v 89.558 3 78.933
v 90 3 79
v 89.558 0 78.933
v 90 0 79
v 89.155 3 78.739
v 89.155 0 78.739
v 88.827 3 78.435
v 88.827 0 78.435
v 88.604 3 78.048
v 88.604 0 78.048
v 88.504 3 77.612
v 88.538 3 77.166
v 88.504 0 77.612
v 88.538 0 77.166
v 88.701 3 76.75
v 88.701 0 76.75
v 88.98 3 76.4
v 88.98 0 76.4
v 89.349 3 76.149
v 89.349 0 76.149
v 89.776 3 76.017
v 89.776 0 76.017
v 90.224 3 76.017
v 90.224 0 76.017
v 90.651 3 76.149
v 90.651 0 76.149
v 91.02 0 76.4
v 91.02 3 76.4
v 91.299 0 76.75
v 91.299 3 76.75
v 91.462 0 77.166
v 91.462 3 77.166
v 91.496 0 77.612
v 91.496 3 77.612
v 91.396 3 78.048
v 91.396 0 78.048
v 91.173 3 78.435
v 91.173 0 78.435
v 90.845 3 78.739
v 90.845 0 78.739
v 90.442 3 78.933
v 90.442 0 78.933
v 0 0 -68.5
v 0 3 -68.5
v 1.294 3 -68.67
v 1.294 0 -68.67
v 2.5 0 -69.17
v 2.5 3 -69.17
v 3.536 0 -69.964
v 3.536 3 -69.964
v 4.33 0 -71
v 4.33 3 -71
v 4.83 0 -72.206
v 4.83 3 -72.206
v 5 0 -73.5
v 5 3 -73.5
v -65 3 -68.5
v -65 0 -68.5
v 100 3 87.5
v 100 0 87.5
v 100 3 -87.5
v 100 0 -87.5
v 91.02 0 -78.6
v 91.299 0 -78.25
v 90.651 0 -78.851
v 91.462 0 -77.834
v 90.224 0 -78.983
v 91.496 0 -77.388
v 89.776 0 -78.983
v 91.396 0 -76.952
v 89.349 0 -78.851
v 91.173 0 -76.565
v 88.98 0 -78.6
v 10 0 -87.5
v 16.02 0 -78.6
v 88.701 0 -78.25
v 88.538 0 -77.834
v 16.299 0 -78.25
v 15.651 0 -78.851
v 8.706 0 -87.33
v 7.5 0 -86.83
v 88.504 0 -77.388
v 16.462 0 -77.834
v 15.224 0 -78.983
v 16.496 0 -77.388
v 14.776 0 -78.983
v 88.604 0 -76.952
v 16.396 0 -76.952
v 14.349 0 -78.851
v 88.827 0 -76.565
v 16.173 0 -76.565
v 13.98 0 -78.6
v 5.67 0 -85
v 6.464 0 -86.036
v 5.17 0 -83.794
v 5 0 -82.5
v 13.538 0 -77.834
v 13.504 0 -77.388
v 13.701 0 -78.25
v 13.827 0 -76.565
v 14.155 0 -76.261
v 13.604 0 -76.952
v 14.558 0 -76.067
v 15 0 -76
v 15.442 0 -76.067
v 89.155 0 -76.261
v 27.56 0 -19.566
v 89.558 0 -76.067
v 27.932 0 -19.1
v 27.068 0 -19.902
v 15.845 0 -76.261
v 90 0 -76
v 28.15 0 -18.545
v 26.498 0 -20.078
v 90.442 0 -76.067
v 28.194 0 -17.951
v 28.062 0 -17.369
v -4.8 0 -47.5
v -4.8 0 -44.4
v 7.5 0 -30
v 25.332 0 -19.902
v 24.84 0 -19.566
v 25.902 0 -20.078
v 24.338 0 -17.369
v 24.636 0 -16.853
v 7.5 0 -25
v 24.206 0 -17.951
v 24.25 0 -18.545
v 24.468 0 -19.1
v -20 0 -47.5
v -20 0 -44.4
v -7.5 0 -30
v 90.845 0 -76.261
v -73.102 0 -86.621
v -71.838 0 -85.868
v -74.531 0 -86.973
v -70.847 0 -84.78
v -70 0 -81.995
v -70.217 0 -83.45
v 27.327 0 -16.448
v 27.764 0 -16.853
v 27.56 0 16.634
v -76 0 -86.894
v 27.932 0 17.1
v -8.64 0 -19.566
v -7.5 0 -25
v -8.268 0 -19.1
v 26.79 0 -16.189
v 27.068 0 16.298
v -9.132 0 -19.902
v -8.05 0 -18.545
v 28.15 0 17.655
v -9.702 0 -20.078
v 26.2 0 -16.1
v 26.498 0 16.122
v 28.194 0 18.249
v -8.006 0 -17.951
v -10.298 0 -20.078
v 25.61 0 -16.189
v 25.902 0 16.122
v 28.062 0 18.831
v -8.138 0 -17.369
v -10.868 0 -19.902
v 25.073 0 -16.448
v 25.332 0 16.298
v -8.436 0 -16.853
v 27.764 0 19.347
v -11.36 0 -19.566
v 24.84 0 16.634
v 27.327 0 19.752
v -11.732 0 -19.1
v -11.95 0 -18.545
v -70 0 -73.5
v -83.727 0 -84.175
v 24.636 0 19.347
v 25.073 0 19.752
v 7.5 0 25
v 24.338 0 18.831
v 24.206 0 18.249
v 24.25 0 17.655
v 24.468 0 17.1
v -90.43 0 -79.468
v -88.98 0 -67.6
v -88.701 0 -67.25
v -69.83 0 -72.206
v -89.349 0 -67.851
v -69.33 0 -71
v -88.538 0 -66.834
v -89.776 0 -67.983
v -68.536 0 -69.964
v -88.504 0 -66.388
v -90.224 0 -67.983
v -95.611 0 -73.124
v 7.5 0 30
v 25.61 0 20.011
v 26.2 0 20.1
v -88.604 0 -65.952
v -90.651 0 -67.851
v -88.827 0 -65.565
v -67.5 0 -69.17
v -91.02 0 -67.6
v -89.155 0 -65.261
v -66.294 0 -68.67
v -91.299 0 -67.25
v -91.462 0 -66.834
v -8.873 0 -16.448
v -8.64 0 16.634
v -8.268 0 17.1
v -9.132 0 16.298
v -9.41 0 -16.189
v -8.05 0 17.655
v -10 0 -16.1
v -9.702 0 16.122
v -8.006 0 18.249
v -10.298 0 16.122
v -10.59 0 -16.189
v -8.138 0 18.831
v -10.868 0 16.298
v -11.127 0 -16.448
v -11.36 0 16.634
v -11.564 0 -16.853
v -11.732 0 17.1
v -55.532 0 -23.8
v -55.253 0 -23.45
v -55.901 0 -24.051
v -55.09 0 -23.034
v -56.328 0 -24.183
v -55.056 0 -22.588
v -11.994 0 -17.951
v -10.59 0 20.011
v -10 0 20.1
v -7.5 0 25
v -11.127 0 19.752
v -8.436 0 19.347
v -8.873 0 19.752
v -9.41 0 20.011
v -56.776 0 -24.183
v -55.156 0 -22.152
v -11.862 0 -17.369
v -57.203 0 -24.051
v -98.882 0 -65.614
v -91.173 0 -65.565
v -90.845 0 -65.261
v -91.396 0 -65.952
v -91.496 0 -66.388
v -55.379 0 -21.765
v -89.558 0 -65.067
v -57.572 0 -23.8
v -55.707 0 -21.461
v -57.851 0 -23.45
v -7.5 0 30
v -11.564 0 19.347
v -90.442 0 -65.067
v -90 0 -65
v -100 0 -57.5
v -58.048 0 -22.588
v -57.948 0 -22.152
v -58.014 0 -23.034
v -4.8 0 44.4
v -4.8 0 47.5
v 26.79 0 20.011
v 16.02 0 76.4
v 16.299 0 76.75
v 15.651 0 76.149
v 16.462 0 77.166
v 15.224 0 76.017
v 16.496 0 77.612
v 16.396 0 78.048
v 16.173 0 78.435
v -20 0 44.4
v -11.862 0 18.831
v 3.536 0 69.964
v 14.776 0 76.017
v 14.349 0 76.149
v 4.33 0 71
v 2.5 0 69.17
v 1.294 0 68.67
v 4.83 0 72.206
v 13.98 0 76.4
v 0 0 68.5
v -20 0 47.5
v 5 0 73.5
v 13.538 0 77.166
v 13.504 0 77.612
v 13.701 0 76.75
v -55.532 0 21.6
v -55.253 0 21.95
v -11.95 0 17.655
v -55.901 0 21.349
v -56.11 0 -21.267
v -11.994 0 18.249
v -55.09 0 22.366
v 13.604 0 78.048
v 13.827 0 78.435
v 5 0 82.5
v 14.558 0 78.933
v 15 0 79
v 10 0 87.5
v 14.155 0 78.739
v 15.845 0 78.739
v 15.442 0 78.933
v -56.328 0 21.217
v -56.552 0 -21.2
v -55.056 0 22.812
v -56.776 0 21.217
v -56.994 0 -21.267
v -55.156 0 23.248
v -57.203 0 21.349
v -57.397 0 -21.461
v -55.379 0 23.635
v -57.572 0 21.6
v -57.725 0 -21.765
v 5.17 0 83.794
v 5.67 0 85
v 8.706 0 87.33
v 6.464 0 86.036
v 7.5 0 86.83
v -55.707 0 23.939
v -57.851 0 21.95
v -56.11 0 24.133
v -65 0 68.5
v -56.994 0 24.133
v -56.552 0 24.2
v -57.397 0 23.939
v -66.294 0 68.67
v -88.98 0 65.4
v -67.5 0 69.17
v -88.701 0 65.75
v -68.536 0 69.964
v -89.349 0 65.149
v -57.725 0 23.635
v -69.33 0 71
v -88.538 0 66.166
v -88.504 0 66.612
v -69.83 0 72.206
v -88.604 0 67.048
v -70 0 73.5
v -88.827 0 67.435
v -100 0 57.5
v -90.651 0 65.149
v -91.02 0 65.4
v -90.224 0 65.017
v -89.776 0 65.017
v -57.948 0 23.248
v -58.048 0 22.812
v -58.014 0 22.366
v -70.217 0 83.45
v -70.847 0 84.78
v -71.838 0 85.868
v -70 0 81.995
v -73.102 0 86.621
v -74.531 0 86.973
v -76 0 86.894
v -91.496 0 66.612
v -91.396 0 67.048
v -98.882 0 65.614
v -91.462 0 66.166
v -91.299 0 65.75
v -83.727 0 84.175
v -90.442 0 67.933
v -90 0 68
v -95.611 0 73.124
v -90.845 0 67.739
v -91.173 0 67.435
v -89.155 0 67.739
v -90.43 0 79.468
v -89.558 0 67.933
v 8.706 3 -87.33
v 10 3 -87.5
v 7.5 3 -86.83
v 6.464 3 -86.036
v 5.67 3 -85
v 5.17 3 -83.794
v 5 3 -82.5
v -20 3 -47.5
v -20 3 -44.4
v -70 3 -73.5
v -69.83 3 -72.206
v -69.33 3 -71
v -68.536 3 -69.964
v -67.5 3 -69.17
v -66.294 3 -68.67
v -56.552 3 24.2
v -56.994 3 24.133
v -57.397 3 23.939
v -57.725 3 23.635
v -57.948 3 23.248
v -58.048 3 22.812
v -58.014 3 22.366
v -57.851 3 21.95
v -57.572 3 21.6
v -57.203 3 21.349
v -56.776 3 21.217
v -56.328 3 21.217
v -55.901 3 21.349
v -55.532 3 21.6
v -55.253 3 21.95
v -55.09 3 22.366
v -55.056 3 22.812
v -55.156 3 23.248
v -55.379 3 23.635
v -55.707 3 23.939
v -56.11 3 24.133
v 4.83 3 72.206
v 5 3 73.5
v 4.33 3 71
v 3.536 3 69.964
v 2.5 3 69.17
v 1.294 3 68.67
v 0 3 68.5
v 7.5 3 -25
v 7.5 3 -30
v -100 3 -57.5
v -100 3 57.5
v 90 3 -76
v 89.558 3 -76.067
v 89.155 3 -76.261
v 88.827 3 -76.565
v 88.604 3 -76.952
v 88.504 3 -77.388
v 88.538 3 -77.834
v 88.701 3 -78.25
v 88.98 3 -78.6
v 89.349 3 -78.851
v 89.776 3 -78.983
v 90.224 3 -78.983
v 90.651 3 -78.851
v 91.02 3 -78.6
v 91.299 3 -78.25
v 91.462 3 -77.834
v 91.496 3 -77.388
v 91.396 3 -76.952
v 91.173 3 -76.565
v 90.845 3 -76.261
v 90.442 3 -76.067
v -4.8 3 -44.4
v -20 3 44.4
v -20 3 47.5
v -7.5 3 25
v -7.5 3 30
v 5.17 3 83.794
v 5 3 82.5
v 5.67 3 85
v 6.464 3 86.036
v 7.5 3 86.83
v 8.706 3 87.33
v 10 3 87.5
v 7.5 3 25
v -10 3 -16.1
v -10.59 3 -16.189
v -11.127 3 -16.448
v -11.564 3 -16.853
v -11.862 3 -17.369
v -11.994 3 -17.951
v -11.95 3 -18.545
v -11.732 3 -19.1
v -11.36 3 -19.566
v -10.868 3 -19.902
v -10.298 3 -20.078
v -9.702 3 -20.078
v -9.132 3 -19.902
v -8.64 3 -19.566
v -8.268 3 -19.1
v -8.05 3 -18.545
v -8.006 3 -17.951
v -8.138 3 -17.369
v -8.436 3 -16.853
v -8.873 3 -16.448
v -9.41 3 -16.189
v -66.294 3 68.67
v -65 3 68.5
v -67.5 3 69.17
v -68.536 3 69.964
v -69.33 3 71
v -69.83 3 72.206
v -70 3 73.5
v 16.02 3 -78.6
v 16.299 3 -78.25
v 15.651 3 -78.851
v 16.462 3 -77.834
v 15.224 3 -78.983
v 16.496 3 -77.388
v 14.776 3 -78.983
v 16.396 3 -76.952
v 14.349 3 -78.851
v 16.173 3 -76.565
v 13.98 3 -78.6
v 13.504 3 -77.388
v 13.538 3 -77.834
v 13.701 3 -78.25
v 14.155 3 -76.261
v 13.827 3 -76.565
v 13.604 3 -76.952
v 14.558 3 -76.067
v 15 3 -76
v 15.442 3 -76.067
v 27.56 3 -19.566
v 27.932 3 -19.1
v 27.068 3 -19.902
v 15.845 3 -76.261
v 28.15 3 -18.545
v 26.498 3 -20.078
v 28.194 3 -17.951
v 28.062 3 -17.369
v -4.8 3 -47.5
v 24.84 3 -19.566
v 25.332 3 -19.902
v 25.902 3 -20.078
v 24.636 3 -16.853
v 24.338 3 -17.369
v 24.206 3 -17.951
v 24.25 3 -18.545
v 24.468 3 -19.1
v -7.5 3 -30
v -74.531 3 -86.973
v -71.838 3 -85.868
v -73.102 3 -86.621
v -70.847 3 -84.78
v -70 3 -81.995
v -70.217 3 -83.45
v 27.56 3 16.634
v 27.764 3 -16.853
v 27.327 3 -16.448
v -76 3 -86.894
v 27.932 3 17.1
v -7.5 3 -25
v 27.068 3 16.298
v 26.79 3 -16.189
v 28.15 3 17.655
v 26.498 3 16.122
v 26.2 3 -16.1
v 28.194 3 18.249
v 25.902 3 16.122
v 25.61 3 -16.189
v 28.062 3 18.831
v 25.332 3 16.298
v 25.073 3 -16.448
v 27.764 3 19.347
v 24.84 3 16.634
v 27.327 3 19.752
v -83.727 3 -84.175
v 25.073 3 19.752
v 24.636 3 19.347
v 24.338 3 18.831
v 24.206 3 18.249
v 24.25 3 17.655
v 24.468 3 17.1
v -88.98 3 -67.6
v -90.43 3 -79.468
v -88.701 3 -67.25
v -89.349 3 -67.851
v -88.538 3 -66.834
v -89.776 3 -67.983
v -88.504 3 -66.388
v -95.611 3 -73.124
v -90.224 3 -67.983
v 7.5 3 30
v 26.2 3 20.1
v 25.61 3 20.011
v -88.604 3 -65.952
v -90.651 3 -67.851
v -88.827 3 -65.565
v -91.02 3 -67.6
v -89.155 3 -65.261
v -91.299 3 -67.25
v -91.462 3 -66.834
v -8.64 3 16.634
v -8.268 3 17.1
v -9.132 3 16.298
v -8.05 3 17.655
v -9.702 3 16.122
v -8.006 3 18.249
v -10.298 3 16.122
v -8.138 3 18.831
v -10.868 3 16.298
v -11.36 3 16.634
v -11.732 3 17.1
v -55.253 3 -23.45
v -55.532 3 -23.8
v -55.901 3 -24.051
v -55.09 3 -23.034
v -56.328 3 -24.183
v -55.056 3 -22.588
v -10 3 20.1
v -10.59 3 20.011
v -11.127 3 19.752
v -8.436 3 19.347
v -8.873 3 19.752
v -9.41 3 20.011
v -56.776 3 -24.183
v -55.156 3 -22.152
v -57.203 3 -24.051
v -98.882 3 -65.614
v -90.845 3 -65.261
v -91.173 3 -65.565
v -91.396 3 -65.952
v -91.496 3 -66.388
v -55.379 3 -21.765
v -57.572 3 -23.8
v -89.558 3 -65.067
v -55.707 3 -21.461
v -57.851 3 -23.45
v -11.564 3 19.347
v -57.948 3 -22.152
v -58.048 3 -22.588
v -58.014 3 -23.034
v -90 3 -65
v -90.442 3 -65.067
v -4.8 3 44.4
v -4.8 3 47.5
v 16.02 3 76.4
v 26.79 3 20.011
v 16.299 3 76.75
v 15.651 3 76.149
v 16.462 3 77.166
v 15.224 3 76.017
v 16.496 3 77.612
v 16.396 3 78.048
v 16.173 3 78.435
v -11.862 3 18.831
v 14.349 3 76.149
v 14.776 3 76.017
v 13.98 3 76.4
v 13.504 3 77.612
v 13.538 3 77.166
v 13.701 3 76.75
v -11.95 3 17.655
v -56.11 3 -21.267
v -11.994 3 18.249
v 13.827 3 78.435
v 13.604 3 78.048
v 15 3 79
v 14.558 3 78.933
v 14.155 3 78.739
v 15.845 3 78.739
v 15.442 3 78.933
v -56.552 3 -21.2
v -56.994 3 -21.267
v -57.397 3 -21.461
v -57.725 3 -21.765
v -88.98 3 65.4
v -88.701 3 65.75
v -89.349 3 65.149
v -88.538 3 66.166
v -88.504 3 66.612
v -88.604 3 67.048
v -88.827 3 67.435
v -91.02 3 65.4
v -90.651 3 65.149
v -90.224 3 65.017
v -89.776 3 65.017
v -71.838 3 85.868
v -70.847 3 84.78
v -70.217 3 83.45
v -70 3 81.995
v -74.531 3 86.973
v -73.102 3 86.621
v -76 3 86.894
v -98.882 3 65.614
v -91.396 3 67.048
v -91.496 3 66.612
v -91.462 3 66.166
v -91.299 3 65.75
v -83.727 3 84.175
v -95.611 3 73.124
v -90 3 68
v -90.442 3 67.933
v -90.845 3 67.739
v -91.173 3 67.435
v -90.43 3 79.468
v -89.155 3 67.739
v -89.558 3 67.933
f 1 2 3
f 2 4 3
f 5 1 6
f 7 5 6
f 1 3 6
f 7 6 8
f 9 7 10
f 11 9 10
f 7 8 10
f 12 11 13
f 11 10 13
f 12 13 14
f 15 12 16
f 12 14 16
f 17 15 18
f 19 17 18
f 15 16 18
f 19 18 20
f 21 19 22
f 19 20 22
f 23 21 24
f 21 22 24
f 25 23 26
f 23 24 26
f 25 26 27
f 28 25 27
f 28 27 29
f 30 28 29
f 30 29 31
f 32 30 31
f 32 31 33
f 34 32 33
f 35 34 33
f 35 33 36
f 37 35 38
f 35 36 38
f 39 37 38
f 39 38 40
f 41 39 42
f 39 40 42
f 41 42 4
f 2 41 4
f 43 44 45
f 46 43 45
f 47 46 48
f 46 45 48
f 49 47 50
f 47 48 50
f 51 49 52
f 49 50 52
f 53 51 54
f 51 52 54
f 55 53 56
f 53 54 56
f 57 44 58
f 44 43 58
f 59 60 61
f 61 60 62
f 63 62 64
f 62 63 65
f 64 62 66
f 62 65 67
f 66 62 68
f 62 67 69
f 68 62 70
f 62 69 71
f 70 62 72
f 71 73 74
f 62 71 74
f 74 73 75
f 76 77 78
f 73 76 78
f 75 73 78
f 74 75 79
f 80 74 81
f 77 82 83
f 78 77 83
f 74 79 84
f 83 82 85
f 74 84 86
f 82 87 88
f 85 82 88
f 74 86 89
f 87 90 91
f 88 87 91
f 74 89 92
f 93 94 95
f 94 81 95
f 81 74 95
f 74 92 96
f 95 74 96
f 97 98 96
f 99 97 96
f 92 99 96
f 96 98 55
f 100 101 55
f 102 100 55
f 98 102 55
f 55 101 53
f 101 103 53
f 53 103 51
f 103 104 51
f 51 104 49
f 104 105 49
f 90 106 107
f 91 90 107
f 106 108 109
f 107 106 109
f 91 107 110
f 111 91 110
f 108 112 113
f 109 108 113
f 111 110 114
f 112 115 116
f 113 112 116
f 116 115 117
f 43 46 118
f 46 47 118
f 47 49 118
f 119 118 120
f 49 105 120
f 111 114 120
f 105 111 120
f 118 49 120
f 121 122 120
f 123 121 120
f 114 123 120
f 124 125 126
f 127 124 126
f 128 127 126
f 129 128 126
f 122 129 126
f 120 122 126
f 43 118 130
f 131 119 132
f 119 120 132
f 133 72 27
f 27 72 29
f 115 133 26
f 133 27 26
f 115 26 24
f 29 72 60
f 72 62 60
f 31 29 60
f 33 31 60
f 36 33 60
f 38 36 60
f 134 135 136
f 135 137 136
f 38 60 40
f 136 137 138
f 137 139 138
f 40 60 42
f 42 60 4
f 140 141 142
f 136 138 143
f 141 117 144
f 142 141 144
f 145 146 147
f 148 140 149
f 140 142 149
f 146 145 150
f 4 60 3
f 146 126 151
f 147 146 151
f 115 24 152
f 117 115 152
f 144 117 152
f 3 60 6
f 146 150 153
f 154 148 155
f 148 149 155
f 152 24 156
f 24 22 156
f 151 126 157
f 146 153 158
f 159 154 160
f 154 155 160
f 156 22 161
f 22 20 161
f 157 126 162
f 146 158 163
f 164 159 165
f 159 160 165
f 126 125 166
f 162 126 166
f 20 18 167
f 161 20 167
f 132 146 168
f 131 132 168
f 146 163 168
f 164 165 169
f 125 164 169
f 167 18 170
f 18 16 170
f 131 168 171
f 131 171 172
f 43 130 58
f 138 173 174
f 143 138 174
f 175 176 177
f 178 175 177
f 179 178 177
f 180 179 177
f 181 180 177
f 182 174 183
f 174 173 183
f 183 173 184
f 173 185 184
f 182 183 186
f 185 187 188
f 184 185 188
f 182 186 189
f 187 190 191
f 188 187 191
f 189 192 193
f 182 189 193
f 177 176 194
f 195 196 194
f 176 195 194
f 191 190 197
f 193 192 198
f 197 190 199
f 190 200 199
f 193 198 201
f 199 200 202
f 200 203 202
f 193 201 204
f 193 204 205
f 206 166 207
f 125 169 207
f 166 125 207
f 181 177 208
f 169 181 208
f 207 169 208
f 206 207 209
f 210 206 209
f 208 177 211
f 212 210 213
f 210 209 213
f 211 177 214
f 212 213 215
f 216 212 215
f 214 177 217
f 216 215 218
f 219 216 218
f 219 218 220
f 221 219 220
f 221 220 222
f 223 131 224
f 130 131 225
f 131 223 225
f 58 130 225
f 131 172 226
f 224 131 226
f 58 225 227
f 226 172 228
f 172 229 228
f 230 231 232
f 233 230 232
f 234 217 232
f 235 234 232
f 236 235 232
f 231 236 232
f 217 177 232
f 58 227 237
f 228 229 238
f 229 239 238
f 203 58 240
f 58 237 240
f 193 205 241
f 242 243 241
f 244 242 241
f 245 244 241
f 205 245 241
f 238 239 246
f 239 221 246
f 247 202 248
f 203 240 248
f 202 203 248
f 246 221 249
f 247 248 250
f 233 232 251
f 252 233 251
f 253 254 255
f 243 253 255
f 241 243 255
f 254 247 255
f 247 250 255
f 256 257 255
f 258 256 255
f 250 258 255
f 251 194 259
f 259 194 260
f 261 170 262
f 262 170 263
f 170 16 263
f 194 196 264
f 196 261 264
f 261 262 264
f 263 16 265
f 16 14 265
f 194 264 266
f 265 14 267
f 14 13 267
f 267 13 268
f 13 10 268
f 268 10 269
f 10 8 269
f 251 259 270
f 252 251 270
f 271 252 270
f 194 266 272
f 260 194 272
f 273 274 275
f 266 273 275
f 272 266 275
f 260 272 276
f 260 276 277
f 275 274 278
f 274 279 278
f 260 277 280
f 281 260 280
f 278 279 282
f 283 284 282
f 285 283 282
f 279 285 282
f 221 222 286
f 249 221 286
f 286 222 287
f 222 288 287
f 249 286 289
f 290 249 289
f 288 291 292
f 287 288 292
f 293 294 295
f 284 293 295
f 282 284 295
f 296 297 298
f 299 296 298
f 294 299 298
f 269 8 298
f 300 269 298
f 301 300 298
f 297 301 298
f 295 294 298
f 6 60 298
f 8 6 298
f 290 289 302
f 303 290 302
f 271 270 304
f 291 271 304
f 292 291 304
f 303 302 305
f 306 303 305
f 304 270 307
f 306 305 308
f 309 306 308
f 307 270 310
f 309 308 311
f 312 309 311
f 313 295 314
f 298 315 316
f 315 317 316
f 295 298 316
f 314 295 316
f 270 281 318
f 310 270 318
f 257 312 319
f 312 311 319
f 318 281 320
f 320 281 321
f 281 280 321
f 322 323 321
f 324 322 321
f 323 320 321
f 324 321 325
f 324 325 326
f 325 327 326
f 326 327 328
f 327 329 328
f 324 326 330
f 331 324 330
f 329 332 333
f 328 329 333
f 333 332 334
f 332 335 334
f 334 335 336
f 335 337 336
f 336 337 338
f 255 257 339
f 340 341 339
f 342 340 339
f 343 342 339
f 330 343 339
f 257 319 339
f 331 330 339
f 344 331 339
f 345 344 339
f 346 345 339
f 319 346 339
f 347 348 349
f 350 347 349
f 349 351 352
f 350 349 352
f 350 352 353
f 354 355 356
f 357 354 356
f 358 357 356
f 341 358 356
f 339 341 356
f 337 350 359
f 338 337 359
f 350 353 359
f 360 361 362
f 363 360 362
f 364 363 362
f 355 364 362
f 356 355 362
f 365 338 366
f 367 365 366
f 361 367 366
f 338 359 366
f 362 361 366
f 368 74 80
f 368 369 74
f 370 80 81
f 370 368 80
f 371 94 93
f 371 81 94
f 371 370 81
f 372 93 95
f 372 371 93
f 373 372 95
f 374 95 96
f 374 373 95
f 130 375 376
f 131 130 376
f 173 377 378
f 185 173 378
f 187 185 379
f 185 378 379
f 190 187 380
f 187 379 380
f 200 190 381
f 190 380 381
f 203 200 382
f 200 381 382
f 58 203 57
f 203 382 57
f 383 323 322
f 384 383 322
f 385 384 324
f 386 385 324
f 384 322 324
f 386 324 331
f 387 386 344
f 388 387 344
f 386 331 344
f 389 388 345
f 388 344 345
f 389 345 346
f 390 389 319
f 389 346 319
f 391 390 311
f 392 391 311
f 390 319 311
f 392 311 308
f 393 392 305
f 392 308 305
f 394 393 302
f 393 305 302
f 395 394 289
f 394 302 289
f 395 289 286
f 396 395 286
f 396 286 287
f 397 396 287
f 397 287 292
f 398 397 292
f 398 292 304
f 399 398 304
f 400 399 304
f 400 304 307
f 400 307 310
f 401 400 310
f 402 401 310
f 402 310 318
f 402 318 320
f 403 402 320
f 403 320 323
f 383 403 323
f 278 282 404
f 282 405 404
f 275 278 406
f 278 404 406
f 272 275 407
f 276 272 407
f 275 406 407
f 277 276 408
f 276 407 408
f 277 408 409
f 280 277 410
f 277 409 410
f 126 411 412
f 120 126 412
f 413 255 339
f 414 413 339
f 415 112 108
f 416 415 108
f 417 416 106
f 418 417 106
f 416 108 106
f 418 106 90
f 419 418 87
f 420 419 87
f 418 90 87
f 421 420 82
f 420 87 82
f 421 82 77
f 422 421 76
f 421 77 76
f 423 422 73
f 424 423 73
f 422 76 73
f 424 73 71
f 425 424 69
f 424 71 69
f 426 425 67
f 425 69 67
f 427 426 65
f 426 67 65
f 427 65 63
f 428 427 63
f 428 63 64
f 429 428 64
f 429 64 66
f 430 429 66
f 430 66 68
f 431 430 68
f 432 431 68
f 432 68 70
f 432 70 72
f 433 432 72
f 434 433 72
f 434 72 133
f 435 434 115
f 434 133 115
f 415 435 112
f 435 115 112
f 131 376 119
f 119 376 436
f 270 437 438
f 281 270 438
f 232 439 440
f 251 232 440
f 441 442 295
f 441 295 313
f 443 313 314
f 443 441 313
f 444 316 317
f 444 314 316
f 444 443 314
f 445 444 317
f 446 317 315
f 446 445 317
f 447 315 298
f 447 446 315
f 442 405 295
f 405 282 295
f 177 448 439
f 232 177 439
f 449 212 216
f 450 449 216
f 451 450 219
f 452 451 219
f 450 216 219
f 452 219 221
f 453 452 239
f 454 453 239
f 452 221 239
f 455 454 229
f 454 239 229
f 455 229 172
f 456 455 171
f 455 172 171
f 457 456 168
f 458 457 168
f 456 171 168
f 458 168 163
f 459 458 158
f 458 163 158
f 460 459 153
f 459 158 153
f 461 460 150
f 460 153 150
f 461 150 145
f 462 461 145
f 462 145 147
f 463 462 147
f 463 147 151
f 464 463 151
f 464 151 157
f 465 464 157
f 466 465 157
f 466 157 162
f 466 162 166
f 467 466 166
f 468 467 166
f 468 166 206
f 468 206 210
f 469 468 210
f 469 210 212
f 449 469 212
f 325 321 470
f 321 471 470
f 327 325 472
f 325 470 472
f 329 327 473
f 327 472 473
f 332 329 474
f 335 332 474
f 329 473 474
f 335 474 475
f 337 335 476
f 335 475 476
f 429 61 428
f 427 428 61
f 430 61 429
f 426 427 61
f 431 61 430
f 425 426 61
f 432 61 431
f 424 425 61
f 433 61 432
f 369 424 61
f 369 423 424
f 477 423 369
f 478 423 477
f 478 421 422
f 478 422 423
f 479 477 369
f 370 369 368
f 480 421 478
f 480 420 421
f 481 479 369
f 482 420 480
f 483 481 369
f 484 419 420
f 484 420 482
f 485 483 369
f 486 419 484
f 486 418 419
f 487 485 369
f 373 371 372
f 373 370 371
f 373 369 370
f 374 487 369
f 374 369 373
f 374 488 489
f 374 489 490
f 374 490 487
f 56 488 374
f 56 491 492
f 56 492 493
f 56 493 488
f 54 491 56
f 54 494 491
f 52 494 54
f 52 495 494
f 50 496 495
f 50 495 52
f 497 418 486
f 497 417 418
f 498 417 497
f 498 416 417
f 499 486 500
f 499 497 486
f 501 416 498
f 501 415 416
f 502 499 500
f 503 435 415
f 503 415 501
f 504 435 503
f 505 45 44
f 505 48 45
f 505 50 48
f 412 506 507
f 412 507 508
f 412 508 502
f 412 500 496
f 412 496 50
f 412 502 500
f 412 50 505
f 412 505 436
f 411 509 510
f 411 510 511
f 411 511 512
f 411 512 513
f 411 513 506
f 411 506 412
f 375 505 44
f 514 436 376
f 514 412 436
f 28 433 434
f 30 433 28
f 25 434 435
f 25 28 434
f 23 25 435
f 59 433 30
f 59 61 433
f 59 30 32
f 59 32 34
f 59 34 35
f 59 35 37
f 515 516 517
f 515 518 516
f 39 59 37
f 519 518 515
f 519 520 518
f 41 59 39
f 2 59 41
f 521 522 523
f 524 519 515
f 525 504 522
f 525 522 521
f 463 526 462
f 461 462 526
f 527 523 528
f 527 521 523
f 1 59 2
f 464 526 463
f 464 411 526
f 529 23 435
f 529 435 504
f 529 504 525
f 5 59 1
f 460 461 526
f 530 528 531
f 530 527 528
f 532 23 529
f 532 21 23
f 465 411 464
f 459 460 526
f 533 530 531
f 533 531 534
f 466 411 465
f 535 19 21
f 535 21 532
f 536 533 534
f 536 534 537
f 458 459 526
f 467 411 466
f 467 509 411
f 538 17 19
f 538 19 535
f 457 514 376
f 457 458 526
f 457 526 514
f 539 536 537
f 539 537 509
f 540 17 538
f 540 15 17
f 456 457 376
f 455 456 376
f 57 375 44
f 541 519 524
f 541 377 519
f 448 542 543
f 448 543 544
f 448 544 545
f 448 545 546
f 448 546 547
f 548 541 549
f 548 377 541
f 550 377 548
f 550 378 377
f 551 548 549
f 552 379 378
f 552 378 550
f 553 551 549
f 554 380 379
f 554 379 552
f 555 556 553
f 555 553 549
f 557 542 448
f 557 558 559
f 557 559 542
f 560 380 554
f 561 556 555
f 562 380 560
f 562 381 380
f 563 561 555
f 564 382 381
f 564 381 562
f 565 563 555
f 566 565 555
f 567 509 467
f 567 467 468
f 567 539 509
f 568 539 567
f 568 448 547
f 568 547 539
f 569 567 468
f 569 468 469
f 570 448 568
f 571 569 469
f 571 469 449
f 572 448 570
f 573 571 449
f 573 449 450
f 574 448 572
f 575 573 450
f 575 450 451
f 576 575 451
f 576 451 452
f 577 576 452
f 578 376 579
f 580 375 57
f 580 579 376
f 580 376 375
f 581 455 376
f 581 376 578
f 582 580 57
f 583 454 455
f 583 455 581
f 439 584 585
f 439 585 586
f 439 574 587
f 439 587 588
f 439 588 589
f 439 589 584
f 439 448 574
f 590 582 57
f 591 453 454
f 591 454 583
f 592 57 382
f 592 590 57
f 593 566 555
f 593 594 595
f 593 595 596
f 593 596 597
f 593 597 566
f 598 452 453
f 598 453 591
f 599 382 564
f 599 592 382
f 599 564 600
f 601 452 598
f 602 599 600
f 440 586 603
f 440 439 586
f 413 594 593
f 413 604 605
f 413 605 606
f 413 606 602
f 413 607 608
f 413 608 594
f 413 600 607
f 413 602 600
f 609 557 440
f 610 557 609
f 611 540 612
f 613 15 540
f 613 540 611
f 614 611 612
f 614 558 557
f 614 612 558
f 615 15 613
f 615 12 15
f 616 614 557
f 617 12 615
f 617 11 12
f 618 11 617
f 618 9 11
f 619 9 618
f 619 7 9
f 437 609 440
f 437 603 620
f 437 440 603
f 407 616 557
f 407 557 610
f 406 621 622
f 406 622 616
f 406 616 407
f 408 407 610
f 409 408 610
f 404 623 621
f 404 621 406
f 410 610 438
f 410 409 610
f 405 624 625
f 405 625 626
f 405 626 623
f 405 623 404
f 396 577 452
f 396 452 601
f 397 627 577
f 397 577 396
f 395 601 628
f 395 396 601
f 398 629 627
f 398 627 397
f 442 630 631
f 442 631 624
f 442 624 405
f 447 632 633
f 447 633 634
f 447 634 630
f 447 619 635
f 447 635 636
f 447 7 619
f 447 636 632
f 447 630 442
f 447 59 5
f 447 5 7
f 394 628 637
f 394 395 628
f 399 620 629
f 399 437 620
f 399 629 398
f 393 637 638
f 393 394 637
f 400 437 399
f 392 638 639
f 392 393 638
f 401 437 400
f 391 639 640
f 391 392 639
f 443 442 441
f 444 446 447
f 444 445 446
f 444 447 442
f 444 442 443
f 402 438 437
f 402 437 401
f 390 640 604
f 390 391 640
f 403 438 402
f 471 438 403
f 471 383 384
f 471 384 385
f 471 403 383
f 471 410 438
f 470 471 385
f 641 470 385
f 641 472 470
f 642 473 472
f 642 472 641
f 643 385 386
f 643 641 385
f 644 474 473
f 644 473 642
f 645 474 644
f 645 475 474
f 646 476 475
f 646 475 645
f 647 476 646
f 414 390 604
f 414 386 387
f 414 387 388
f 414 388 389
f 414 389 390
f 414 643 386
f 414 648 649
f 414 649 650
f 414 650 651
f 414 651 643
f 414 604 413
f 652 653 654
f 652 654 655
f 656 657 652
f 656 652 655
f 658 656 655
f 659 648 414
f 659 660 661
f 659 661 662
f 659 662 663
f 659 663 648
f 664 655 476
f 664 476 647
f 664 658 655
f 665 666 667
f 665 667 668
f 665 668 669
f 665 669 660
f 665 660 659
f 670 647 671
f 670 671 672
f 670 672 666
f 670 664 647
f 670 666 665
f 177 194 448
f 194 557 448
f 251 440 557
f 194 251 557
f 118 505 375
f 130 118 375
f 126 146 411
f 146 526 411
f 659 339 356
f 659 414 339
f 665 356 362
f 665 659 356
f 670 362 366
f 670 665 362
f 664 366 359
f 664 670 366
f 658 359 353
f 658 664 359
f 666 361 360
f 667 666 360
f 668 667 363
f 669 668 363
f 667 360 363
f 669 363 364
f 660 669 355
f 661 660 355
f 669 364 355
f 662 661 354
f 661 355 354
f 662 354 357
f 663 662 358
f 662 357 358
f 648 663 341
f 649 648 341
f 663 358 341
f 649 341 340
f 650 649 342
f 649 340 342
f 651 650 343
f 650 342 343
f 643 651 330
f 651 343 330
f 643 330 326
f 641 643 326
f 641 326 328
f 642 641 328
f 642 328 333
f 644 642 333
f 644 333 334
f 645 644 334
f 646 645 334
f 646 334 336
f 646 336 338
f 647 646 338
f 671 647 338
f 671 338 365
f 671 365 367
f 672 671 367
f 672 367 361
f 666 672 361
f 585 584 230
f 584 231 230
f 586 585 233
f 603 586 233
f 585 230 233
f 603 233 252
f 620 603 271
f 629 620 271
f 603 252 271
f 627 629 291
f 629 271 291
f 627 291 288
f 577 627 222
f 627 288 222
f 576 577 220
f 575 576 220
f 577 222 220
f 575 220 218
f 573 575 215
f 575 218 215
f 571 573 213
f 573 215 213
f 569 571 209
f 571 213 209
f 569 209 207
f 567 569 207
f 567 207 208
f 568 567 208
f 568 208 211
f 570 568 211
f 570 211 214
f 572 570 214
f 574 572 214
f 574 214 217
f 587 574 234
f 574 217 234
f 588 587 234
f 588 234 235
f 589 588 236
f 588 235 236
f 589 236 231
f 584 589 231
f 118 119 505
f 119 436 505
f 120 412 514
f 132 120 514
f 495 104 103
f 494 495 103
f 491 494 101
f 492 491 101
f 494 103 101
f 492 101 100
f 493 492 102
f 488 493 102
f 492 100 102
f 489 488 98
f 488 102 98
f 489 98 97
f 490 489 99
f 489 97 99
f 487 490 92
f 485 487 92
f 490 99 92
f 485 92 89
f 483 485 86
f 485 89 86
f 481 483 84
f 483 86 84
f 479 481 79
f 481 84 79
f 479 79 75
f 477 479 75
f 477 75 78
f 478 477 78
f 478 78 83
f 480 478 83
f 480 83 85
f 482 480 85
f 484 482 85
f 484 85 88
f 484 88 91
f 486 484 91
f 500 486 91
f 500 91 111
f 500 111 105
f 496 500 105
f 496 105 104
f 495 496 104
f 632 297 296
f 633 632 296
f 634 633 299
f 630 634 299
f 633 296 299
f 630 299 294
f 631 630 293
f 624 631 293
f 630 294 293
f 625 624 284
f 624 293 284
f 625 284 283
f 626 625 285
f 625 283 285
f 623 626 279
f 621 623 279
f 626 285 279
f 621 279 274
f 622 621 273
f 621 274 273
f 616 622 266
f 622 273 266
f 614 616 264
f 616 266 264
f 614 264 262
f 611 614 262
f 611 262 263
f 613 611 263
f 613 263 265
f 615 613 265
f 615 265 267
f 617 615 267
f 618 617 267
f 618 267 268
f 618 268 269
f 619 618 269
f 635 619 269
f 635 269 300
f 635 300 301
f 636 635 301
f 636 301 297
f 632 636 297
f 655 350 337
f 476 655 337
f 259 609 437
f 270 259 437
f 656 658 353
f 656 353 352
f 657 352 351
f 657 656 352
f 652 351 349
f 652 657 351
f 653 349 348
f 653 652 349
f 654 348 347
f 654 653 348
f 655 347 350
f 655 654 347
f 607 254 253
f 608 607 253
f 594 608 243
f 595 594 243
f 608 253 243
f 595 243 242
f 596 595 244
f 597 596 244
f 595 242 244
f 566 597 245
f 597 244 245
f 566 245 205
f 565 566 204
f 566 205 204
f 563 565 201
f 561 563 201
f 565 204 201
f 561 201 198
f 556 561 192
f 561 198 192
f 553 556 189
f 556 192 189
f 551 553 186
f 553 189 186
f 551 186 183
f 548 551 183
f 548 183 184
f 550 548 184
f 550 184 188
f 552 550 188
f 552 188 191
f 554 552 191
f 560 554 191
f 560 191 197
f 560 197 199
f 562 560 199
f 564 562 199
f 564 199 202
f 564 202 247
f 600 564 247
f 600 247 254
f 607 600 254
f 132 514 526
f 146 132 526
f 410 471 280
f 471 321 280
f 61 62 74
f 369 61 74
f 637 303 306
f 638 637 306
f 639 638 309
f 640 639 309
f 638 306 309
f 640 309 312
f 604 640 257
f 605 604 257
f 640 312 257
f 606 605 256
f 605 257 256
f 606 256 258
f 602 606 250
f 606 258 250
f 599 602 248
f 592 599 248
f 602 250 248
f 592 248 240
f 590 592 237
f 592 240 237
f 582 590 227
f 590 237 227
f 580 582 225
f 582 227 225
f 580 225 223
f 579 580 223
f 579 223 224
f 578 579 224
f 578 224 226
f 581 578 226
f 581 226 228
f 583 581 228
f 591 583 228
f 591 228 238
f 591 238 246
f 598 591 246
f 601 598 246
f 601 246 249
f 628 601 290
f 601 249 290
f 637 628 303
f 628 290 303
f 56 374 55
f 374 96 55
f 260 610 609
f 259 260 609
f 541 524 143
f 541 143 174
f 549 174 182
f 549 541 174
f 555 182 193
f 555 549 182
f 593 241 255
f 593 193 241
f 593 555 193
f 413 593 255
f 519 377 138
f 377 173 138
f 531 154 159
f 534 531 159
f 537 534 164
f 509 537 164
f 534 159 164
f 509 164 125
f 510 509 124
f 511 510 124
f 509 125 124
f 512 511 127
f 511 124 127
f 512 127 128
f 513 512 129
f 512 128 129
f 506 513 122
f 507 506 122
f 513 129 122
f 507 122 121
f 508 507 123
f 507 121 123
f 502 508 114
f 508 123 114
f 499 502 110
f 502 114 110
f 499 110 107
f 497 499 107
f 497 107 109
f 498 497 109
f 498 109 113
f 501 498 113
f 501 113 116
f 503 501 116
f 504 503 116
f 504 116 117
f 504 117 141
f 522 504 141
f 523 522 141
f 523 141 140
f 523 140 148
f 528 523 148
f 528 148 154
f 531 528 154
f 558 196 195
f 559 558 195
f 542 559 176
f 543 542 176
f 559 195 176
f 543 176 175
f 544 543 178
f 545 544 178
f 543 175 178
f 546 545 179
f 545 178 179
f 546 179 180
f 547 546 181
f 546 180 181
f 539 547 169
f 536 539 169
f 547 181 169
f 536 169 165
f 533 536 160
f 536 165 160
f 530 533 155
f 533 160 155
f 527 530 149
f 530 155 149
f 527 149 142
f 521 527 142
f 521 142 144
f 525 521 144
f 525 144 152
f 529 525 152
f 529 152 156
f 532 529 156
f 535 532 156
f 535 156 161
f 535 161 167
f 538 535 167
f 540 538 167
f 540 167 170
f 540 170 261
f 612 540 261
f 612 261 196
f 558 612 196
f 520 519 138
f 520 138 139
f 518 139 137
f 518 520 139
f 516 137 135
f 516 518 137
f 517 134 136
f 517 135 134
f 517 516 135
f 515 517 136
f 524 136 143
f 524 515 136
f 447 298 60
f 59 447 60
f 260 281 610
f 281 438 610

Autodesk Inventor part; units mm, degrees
ref_plane "YZ Plane" through (0, 0, 0) normal (1, 0, 0) x (0, 1, 0)
ref_plane "XZ Plane" through (0, 0, 0) normal (0, 1, 0) x (-1, 0, 0)
ref_plane "XY Plane" through (0, 0, 0) normal (0, 0, 1) x (1, 0, 0)
sketch "Boceto1" plane through (0, 0, 0) normal (0, 1, 0) x (-1, 0, 0)
  line L0 (100, 87.5) -> (-100, 87.5)
  line L1 (-100, 87.5) -> (-100, -87.5)
  line L2 (-100, -87.5) -> (100, -87.5)
  line L3 (100, -87.5) -> (100, 87.5)
  line L4 (100, 87.5) -> (-100, -87.5) construction
  line L5 (-100, 87.5) -> (100, -87.5) construction
  point P0 (0, 0)
  dimension "d0" = 175
  dimension "d1" = 200
extrude "Extrusión1" add sketch "Boceto1" along normal blind 3
sketch "Boceto2" plane through (0, 3, 0) normal (0, 1, 0) x (1, 0, 0)
  line L0 (-4.8, 47.5) -> (-20, 47.5)
  line L1 (-20, 47.5) -> (-20, 44.4)
  line L2 (-20, 44.4) -> (-4.8, 44.4)
  line L3 (-4.8, 44.4) -> (-4.8, 47.5)
  line L4 (100, 87.5) -> (-100, 87.5) construction
  line L5 (-100, 87.5) -> (-100, -87.5) construction
  point P0 (0, 0)
  dimension "d4" = 15.2
  dimension "d5" = 3.1
  dimension "d6" = 40
  dimension "d7" = 80
extrude "Extrusión2" cut sketch "Boceto2" against normal blind 3
fillet "Empalme1" radius 30 2 edges at (-100, 1.5, -87.5) (-100, 1.5, 87.5)
sketch "Boceto3" plane through (0, 0, 0) normal (0, -1, 0) x (1, 0, 0)
  line L0 (-70, -87.5) -> (5, -87.5)
  line L1 (5, -87.5) -> (5, -68.5)
  line L2 (5, -68.5) -> (-70, -68.5)
  line L3 (-70, -68.5) -> (-70, -87.5)
  point P0 (0, 0)
  dimension "d11" = 75
  dimension "d12" = 19
extrude "Extrusión3" cut sketch "Boceto3" against normal blind 3
mirror "Simetría1" about plane through (0, 0, 0) normal (0, 0, 1) of "Extrusión3"
fillet "Empalme3" radius 5 8 edges at (-70, 1.5, 87.5) (-70, 1.5, 68.5) (5, 1.5, 68.5) (5, 1.5, 87.5) (-70, 1.5, -87.5) (-70, 1.5, -68.5) (5, 1.5, -68.5) (5, 1.5, -87.5)
mirror "Simetría2" about plane through (0, 0, 0) normal (0, 0, 1) of "Extrusión2"
sketch "Boceto6" plane through (0, 3, 0) normal (0, 1, 0) x (1, 0, 0)
  line L0 (-100, 57.5) -> (-100, -57.5) construction
  line L1 (-10, -18.1) -> (26.2, -18.1) construction
  line L2 (-100, 0) -> (100, 0) construction
  line L3 (100, -87.5) -> (100, 87.5) construction
  line L4 (100, 87.5) -> (100, -87.5) construction
  point P0 (0, 0)
  point P1 (-10, 18.1)
  point P2 (26.2, 18.1)
  dimension "d36" = 90
  dimension "d37" = 36.2
  dimension "d38" = 36.2
  dimension "d39" = 18.1
hole "Agujero3" at (-10, 3, 18.1) at (26.2, 3, 18.1) at (-10, 3, -18.1) at (26.2, 3, -18.1) direction (0, -1, 0) diameter 4 end through all
sketch "Boceto7" plane through (0, 3, 0) normal (0, 1, 0) x (1, 0, 0)
  line L0 (-7.5, -30) -> (7.5, -30)
  line L1 (7.5, -30) -> (7.5, -25)
  line L2 (7.5, -25) -> (-7.5, -25)
  line L3 (-7.5, -25) -> (-7.5, -30)
  point P0 (0, 0)
  point P1 (0, -25)
  dimension "d47" = 5
  dimension "d48" = 15
  dimension "d49" = 25
extrude "Extrusión4" cut sketch "Boceto7" against normal blind 3
mirror "Simetría3" about plane through (0, 0, 0) normal (0, 0, 1) of "Extrusión4"
sketch "Boceto9" plane through (0, 3, 0) normal (0, 1, 0) x (1, 0, 0)
  line L0 (-85, 22.7) -> (-85, -22.7) construction
  line L1 (100, -87.5) -> (100, 87.5) construction
  line L2 (100, 0) -> (-100, 0) construction
  line L3 (-56.552, 22.7) -> (-56.552, -22.7) construction
  line L4 (-100, 57.5) -> (-100, -57.5) construction
  point P0 (0, 0)
  point P1 (-85, 0)
  dimension "d52" = 28.448
  dimension "d54" = 45.4
  dimension "d55" = 15
hole "Agujero4" at (-56.552, 3, -22.7) at (-56.552, 3, 22.7) direction (0, -1, 0) diameter 3 end through all
sketch "Boceto10" plane through (0, 3, 0) normal (0, 1, 0) x (1, 0, 0)
  line L0 (-65, -68.5) -> (0, -68.5) projected
  line L1 (-90, -66.5) -> (-90, 66.5) construction
  line L2 (-100, 57.5) -> (-100, -57.5) construction
  line L3 (90, -77.5) -> (15, -77.5) construction
  line L4 (90, 77.5) -> (15, 77.5) construction
  line L5 (100, -87.5) -> (100, 87.5) construction
  line L6 (5, 82.5) -> (5, 73.5) construction
  line L7 (100, 87.5) -> (10, 87.5) construction
  line L8 (10, -87.5) -> (100, -87.5) construction
  point P0 (0, 0)
  point P1 (-90, 0)
  dimension "d63" = 2
  dimension "d64" = 10
  dimension "d65" = 10
  dimension "d66" = 10
  dimension "d67" = 10
  dimension "d68" = 10
hole "Agujero5" at (90, 3, -77.5) at (15, 3, -77.5) at (90, 3, 77.5) at (15, 3, 77.5) at (-90, 3, -66.5) at (-90, 3, 66.5) direction (0, -1, 0) diameter 3 end through all
properties part number "Base_Carro"
